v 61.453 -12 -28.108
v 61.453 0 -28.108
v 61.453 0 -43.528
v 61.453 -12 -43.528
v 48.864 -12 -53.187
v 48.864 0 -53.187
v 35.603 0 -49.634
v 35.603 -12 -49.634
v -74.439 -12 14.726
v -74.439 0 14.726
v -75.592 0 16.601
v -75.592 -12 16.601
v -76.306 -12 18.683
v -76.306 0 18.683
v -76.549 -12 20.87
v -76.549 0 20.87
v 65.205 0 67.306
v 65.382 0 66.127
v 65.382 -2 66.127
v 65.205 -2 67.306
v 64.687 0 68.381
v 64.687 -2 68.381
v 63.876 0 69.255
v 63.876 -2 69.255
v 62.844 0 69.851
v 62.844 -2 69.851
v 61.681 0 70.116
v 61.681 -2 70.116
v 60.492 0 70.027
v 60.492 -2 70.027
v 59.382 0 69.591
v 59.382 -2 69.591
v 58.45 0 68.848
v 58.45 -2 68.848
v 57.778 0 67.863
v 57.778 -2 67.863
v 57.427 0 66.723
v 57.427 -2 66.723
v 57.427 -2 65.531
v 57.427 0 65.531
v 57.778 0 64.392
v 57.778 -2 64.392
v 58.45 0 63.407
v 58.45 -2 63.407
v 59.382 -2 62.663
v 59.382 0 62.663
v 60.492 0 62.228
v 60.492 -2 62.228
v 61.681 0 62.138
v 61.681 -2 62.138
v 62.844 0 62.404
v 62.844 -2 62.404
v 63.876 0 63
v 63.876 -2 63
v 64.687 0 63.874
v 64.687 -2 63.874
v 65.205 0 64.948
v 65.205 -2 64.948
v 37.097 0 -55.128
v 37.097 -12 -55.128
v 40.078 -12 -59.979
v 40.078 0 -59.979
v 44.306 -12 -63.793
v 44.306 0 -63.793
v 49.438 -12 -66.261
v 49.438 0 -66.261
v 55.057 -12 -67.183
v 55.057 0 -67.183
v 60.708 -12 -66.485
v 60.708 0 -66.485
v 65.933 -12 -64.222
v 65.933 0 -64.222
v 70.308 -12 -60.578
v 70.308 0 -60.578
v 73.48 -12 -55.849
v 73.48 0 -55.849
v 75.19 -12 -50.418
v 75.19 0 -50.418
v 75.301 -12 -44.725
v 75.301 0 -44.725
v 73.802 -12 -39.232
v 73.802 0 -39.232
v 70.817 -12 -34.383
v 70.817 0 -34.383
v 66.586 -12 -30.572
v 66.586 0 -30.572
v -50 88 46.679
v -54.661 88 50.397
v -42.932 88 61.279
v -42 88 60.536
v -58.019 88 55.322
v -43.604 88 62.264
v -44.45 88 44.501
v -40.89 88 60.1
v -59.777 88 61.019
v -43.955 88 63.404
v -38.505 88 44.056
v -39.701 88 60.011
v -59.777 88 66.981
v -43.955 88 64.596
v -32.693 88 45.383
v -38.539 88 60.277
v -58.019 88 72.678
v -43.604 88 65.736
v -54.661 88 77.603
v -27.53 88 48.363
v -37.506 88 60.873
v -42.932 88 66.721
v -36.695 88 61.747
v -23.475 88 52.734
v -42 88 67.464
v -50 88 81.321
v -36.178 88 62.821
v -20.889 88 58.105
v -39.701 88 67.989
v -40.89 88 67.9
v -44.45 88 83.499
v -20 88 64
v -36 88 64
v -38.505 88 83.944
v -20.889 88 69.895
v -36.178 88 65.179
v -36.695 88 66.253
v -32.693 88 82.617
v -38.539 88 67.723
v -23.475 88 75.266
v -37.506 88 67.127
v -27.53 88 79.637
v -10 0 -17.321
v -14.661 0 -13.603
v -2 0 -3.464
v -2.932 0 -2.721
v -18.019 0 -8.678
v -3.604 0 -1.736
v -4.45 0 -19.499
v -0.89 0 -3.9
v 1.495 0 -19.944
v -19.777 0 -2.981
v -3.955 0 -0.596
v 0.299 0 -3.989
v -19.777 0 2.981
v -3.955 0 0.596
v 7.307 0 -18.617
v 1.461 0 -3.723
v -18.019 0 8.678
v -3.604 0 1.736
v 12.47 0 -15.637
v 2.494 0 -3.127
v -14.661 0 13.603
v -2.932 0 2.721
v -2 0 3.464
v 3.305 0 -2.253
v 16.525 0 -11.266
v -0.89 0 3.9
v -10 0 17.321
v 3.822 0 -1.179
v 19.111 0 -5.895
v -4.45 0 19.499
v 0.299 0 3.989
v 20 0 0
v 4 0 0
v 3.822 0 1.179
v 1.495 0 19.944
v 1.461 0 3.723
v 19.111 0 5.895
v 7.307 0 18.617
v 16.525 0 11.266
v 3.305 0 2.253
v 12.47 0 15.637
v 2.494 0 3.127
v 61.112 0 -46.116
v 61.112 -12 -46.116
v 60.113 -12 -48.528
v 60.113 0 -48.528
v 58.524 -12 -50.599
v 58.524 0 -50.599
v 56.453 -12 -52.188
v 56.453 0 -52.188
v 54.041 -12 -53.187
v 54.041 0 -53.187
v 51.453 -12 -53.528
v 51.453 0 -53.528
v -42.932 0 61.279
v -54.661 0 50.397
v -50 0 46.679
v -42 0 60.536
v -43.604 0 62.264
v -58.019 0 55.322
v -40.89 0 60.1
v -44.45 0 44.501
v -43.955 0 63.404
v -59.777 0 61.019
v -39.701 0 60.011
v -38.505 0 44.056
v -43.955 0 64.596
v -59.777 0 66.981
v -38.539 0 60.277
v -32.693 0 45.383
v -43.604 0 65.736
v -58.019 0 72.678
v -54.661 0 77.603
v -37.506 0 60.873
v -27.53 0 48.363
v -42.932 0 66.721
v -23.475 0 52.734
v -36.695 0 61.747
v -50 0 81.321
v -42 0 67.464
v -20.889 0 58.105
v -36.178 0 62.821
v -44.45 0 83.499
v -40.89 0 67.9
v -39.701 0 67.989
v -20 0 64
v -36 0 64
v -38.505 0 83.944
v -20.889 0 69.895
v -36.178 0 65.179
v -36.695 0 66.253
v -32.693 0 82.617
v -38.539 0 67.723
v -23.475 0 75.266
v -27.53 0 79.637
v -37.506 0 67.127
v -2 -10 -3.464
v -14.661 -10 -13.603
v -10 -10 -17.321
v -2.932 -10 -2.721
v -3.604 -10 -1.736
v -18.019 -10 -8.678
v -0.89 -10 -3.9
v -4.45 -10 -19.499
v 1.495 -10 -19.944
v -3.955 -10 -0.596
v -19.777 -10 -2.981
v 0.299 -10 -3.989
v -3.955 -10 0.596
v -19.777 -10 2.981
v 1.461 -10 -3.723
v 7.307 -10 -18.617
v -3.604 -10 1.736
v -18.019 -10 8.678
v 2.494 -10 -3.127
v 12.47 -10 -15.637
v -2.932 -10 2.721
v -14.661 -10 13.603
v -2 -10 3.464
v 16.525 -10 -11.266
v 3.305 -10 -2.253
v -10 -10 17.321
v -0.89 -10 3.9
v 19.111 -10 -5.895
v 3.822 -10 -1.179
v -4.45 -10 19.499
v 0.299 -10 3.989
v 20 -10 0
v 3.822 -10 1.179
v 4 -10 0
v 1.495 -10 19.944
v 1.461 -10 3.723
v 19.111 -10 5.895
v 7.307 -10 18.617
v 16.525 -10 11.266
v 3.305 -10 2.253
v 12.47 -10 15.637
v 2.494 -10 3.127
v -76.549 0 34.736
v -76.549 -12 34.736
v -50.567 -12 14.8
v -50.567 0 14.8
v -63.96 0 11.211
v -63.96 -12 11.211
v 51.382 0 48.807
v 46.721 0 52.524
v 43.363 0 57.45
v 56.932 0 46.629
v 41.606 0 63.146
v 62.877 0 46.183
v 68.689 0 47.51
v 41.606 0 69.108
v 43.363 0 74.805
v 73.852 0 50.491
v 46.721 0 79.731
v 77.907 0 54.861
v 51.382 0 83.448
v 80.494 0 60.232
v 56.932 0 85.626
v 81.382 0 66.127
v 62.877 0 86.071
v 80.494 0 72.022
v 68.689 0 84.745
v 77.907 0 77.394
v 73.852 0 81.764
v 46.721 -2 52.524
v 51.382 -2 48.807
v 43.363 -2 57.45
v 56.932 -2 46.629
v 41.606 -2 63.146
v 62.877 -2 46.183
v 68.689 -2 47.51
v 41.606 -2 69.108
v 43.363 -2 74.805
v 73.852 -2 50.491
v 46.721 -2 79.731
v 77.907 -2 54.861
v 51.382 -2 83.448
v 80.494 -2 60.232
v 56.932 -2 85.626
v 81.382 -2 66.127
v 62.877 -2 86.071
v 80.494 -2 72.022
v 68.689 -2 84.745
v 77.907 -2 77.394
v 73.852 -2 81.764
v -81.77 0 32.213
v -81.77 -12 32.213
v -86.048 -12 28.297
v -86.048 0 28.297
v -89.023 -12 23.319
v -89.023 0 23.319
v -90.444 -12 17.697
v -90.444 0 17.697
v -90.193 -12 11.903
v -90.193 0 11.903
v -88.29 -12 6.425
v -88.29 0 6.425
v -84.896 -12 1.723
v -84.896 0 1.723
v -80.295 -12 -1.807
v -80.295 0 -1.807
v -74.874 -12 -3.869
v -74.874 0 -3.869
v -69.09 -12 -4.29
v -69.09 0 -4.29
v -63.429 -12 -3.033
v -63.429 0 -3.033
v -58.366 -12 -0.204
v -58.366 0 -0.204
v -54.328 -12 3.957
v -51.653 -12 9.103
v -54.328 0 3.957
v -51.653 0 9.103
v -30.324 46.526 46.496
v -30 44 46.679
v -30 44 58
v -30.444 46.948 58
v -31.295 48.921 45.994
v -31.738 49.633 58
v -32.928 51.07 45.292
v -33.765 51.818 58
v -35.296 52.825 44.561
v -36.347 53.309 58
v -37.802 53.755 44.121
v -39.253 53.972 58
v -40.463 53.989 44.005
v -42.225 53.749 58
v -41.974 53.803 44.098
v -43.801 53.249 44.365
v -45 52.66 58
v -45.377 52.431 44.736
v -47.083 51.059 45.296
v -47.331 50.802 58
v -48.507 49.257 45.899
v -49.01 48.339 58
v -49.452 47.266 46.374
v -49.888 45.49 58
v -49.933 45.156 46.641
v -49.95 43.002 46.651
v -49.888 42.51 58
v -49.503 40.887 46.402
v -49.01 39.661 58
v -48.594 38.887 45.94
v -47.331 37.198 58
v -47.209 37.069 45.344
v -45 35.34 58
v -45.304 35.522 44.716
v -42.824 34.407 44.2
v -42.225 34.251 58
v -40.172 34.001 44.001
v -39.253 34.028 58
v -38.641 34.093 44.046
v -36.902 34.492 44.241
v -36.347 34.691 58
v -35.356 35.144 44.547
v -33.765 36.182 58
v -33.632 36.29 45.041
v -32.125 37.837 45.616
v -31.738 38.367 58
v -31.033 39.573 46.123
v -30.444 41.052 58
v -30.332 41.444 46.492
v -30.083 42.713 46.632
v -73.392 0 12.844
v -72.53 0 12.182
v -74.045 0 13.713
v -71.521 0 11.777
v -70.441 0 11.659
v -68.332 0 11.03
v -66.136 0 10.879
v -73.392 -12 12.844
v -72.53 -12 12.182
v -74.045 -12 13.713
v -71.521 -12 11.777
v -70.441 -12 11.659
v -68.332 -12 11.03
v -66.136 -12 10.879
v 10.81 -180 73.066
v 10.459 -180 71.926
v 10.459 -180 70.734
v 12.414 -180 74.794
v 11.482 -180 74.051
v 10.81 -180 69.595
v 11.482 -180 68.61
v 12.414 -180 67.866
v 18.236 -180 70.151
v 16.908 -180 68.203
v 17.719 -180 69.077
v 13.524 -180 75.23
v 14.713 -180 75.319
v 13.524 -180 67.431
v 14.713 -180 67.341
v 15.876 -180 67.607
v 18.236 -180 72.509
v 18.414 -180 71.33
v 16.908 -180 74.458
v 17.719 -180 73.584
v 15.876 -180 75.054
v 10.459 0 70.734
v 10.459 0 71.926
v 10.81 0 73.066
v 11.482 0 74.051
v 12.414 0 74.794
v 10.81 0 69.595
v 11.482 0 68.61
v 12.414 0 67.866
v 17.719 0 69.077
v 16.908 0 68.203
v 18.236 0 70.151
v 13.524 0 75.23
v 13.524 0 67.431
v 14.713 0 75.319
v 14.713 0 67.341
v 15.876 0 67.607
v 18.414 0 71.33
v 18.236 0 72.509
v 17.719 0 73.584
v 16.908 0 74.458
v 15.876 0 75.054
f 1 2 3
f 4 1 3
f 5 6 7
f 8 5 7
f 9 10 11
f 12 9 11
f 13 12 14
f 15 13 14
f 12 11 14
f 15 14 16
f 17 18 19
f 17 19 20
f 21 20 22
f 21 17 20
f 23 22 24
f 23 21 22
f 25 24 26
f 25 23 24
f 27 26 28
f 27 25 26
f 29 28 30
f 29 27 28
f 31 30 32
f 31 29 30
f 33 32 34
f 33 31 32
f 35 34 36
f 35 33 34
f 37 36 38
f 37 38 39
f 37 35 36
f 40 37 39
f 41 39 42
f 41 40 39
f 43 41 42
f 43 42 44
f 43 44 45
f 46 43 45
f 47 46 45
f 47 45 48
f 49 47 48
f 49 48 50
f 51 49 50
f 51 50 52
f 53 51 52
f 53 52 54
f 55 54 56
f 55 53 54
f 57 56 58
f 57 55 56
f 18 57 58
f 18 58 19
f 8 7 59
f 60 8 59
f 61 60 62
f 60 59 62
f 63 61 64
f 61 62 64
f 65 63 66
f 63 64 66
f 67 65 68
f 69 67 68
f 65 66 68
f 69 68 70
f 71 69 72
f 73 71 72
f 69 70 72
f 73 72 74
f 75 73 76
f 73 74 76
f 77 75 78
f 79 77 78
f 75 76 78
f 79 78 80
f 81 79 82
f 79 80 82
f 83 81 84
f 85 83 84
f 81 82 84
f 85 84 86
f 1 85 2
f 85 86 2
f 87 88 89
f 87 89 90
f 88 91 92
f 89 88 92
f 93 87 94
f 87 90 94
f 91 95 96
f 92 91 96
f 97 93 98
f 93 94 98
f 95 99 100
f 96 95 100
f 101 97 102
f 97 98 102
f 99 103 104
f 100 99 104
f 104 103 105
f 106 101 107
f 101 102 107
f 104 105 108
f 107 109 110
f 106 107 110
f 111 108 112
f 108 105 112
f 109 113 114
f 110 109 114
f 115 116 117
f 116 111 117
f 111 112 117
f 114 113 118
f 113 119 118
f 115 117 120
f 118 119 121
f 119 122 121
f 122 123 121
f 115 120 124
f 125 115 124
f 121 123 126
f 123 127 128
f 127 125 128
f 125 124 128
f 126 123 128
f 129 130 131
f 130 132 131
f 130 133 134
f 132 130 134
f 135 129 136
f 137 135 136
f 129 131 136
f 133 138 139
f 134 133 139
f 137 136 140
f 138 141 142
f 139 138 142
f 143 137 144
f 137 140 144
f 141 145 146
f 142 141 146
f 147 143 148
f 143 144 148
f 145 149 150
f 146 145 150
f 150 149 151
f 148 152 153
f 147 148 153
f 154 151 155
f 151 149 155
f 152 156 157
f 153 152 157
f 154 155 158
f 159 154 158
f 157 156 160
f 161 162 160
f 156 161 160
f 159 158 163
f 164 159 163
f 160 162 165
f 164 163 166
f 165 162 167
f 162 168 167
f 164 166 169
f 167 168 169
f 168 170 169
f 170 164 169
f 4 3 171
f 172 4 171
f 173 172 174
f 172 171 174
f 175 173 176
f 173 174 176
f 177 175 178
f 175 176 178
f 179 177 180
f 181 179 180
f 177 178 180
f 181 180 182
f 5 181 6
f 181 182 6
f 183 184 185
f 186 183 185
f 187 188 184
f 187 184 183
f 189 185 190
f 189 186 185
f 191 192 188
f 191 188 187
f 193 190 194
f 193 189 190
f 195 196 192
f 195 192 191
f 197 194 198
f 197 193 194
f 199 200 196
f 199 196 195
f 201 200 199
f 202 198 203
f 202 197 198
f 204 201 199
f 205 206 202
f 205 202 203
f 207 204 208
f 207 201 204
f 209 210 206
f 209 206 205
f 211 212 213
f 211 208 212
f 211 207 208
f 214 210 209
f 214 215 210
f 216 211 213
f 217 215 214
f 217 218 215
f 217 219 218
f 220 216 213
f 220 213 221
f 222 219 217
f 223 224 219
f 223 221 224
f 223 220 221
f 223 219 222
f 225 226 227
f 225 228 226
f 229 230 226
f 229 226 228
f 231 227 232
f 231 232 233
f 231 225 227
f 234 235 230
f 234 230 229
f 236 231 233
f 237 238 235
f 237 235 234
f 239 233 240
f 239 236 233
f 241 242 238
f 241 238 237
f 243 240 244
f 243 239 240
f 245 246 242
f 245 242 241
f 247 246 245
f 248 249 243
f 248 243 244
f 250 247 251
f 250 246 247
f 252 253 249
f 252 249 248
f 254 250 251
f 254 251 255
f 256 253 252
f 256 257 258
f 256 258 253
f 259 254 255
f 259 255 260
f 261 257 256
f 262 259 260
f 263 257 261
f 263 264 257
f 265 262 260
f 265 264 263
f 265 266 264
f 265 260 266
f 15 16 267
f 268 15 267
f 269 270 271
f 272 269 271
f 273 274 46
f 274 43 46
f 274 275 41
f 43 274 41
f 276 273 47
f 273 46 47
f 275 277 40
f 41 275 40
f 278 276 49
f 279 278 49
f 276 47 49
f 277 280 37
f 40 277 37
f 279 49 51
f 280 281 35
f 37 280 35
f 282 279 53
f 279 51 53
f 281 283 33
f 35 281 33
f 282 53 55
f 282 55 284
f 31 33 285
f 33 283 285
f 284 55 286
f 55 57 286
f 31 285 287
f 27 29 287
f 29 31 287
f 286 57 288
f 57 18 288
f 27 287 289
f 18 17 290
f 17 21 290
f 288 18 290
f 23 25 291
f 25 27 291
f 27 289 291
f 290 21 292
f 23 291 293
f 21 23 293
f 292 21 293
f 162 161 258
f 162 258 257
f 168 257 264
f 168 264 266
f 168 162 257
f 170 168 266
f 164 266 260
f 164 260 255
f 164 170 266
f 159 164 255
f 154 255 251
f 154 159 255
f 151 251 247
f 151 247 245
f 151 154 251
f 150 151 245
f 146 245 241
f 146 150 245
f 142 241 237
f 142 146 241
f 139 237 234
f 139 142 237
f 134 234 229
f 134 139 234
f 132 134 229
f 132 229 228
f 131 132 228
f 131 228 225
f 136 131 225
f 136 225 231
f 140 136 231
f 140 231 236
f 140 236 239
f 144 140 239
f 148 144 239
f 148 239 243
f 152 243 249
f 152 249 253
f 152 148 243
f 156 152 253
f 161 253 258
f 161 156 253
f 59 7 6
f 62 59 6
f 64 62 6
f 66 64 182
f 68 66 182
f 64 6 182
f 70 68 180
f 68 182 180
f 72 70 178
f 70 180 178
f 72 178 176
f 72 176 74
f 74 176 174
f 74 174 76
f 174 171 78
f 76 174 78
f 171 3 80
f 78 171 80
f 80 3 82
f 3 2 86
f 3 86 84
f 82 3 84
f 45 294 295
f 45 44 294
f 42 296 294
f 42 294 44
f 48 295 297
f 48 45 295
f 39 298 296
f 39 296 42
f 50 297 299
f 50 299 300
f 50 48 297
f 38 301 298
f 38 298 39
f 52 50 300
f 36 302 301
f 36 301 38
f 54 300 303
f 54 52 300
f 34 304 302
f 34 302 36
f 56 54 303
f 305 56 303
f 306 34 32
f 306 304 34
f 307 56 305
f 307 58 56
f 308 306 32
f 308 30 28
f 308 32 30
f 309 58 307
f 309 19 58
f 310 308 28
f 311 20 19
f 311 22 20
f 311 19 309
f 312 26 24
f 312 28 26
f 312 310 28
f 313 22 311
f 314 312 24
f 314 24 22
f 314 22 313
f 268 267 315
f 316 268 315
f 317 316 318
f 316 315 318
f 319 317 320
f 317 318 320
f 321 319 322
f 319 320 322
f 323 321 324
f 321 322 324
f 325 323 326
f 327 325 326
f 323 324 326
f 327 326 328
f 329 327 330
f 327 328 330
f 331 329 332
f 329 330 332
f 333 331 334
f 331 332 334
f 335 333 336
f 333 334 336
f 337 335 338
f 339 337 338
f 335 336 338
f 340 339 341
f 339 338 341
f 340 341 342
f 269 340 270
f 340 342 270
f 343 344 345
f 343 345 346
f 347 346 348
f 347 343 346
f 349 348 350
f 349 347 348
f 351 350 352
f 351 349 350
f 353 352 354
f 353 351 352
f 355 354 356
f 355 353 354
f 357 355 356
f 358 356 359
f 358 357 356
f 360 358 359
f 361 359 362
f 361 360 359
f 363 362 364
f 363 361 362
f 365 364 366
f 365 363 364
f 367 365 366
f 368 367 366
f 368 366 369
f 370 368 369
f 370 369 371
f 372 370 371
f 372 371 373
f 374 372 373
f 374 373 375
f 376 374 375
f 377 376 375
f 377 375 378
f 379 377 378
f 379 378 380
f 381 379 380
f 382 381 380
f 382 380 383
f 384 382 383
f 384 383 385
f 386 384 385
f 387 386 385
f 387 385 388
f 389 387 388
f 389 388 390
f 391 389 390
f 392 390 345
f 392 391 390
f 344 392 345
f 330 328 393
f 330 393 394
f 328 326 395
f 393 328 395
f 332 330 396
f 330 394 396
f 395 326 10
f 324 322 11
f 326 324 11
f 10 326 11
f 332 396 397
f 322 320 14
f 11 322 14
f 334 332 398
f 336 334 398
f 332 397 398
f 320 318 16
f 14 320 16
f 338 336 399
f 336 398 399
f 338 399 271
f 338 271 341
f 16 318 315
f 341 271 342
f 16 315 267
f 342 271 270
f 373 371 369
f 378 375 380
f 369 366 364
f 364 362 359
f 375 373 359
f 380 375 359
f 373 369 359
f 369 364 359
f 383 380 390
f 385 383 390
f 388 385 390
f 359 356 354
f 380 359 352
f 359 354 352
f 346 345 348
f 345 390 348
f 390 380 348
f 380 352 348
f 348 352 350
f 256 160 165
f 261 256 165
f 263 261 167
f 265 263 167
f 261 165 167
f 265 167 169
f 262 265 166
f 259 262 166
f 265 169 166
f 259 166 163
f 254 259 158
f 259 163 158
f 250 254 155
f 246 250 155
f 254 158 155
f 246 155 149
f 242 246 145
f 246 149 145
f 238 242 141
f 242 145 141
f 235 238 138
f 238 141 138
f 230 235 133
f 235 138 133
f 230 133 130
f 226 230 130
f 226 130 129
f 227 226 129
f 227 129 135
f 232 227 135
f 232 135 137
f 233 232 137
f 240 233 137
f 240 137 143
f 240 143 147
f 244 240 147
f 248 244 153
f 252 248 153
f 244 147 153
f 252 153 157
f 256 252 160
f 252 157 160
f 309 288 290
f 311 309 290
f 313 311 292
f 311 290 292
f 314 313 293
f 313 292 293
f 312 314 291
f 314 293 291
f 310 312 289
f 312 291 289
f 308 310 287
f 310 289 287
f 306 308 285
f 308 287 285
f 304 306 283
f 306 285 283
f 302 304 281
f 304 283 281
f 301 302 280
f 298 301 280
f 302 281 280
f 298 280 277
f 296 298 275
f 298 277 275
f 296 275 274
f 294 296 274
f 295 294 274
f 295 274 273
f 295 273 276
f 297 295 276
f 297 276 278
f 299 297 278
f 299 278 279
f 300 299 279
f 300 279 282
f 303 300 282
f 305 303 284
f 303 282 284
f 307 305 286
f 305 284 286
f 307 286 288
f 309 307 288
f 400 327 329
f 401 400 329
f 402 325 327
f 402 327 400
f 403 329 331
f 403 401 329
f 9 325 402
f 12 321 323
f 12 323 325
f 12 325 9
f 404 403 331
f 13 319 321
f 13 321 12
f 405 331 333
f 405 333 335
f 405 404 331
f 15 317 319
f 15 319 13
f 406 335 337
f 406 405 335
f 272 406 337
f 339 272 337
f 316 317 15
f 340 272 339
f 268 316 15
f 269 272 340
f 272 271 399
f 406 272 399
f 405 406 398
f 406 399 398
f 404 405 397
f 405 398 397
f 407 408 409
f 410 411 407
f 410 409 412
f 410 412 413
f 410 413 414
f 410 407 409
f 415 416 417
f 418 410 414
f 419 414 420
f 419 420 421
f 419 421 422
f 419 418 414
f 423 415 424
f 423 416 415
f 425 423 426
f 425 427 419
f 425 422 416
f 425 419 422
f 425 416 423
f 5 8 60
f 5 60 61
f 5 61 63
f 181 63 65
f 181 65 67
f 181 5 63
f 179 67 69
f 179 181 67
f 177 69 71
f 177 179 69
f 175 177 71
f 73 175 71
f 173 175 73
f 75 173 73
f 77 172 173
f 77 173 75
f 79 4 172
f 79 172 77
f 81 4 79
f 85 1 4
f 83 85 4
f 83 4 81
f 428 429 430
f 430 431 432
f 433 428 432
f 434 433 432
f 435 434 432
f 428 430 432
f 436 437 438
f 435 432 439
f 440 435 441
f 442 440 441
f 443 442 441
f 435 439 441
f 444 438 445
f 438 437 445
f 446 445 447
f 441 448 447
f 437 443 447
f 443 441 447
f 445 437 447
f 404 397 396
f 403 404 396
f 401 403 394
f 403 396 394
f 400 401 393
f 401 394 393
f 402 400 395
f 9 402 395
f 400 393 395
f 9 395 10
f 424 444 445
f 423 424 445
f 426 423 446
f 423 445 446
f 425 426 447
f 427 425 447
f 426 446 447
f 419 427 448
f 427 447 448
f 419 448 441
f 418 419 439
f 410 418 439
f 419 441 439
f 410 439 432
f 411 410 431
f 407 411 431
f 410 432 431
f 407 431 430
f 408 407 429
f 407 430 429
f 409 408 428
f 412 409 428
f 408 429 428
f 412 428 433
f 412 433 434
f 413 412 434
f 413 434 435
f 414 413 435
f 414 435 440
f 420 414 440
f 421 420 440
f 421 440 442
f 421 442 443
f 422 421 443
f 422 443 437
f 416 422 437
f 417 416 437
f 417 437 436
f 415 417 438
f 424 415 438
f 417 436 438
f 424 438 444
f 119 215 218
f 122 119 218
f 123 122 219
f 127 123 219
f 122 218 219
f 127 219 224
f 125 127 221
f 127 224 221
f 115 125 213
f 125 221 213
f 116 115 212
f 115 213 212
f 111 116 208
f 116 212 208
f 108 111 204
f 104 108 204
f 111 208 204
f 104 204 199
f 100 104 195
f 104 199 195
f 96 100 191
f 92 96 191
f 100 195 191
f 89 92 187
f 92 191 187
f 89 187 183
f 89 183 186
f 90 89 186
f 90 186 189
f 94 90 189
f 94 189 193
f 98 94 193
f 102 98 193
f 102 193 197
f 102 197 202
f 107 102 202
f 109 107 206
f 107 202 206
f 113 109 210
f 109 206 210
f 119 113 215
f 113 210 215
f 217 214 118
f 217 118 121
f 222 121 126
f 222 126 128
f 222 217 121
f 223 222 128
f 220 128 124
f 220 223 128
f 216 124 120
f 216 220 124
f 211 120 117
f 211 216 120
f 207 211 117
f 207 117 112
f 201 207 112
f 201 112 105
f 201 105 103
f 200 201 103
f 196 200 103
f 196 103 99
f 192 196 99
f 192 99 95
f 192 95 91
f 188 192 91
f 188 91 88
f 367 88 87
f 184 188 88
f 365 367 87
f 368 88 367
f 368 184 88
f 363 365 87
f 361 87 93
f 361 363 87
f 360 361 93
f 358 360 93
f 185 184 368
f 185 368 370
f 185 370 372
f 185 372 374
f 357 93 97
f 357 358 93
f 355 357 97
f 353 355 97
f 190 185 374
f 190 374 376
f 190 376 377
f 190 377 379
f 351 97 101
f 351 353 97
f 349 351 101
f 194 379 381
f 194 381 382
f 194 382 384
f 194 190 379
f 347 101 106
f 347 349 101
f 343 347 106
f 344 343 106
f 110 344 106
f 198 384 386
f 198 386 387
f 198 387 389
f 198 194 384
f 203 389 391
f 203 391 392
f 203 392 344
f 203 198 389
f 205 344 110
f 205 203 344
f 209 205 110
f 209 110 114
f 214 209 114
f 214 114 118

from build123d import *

# Parameters (mm, degrees)
F0_R      = 20
F0_R_2    = 4
F1_DEPTH  = 10
F3_DEPTH  = 12
F4_R      = 20
F4_R_2    = 4
F5_DEPTH  = 2
F6_R      = 20
F6_R_2    = 4
F7_DEPTH  = 88
F9_DEPTH  = 12
F10_R     = 4
F11_DEPTH = 180
F12_R     = 10
F13_DEPTH = 58


with BuildPart() as f1:
    # F0 (on Front) → F1 (new body)
    with BuildSketch(Plane.XZ):
        Circle(F0_R)
        Circle(F0_R_2, mode=Mode.SUBTRACT)
    extrude(amount=F1_DEPTH)


with BuildPart() as f3:
    # F2 (on Front) → F3 (new body)
    with BuildSketch(Plane.XZ):
        with BuildLine():
            Line((-76.548523, 20.870079), (-76.548523, 34.735962))
            ThreePointArc((-76.548523, 34.735962), (-82.723751, -0.209889), (-50.566918, 14.799575))
            Line((-50.566918, 14.799575), (-63.960332, 11.210821))
            ThreePointArc((-63.960332, 11.210821), (-67.237901, 10.89387), (-70.440722, 11.658631))
            ThreePointArc((-70.440722, 11.658631), (-72.983568, 12.483764), (-74.438723, 14.726405))
            ThreePointArc((-74.438723, 14.726405), (-76.006377, 17.622157), (-76.548523, 20.870079))
        make_face()
    extrude(amount=F3_DEPTH)


with BuildPart() as f5:
    # F4 (on Front) → F5 (new body)
    with BuildSketch(Plane.XZ):
        with Locations((61.382338, 66.127263)):
            Circle(F4_R)
        with Locations((61.382338, 66.127263)):
            Circle(F4_R_2, mode=Mode.SUBTRACT)
    extrude(amount=F5_DEPTH)


with BuildPart() as f7:
    # F6 (on Front) → F7 (new body)
    with BuildSketch(Plane.XZ):
        with Locations((-40, 64)):
            Circle(F6_R)
        with Locations((-40, 64)):
            Circle(F6_R_2, mode=Mode.SUBTRACT)
    extrude(amount=-F7_DEPTH)

    # F12 (on Top) → F13 (cut)
    with BuildSketch(Plane.XY):
        with Locations((-40, 44)):
            Circle(F12_R)
    extrude(amount=F13_DEPTH, mode=Mode.SUBTRACT)


with BuildPart() as f9:
    # F8 (on Front) → F9 (new body)
    with BuildSketch(Plane.XZ):
        with BuildLine():
            Line((48.864472, -53.187266), (35.602868, -49.63383))
            ThreePointArc((35.602868, -49.63383), (68.250684, -62.556412), (61.452662, -28.108482))
            Line((61.452662, -28.108482), (61.452662, -43.528008))
            ThreePointArc((61.452662, -43.528008), (57.540277, -51.461541), (48.864472, -53.187266))
        make_face()
    extrude(amount=F9_DEPTH)


with BuildPart() as f11:
    # F10 (on Front) → F11 (new body)
    with BuildSketch(Plane.XZ):
        with Locations((14.414172, 71.330287)):
            Circle(F10_R)
    extrude(amount=F11_DEPTH)


solid = Compound([f1.part, f3.part, f5.part, f7.part, f9.part, f11.part])
